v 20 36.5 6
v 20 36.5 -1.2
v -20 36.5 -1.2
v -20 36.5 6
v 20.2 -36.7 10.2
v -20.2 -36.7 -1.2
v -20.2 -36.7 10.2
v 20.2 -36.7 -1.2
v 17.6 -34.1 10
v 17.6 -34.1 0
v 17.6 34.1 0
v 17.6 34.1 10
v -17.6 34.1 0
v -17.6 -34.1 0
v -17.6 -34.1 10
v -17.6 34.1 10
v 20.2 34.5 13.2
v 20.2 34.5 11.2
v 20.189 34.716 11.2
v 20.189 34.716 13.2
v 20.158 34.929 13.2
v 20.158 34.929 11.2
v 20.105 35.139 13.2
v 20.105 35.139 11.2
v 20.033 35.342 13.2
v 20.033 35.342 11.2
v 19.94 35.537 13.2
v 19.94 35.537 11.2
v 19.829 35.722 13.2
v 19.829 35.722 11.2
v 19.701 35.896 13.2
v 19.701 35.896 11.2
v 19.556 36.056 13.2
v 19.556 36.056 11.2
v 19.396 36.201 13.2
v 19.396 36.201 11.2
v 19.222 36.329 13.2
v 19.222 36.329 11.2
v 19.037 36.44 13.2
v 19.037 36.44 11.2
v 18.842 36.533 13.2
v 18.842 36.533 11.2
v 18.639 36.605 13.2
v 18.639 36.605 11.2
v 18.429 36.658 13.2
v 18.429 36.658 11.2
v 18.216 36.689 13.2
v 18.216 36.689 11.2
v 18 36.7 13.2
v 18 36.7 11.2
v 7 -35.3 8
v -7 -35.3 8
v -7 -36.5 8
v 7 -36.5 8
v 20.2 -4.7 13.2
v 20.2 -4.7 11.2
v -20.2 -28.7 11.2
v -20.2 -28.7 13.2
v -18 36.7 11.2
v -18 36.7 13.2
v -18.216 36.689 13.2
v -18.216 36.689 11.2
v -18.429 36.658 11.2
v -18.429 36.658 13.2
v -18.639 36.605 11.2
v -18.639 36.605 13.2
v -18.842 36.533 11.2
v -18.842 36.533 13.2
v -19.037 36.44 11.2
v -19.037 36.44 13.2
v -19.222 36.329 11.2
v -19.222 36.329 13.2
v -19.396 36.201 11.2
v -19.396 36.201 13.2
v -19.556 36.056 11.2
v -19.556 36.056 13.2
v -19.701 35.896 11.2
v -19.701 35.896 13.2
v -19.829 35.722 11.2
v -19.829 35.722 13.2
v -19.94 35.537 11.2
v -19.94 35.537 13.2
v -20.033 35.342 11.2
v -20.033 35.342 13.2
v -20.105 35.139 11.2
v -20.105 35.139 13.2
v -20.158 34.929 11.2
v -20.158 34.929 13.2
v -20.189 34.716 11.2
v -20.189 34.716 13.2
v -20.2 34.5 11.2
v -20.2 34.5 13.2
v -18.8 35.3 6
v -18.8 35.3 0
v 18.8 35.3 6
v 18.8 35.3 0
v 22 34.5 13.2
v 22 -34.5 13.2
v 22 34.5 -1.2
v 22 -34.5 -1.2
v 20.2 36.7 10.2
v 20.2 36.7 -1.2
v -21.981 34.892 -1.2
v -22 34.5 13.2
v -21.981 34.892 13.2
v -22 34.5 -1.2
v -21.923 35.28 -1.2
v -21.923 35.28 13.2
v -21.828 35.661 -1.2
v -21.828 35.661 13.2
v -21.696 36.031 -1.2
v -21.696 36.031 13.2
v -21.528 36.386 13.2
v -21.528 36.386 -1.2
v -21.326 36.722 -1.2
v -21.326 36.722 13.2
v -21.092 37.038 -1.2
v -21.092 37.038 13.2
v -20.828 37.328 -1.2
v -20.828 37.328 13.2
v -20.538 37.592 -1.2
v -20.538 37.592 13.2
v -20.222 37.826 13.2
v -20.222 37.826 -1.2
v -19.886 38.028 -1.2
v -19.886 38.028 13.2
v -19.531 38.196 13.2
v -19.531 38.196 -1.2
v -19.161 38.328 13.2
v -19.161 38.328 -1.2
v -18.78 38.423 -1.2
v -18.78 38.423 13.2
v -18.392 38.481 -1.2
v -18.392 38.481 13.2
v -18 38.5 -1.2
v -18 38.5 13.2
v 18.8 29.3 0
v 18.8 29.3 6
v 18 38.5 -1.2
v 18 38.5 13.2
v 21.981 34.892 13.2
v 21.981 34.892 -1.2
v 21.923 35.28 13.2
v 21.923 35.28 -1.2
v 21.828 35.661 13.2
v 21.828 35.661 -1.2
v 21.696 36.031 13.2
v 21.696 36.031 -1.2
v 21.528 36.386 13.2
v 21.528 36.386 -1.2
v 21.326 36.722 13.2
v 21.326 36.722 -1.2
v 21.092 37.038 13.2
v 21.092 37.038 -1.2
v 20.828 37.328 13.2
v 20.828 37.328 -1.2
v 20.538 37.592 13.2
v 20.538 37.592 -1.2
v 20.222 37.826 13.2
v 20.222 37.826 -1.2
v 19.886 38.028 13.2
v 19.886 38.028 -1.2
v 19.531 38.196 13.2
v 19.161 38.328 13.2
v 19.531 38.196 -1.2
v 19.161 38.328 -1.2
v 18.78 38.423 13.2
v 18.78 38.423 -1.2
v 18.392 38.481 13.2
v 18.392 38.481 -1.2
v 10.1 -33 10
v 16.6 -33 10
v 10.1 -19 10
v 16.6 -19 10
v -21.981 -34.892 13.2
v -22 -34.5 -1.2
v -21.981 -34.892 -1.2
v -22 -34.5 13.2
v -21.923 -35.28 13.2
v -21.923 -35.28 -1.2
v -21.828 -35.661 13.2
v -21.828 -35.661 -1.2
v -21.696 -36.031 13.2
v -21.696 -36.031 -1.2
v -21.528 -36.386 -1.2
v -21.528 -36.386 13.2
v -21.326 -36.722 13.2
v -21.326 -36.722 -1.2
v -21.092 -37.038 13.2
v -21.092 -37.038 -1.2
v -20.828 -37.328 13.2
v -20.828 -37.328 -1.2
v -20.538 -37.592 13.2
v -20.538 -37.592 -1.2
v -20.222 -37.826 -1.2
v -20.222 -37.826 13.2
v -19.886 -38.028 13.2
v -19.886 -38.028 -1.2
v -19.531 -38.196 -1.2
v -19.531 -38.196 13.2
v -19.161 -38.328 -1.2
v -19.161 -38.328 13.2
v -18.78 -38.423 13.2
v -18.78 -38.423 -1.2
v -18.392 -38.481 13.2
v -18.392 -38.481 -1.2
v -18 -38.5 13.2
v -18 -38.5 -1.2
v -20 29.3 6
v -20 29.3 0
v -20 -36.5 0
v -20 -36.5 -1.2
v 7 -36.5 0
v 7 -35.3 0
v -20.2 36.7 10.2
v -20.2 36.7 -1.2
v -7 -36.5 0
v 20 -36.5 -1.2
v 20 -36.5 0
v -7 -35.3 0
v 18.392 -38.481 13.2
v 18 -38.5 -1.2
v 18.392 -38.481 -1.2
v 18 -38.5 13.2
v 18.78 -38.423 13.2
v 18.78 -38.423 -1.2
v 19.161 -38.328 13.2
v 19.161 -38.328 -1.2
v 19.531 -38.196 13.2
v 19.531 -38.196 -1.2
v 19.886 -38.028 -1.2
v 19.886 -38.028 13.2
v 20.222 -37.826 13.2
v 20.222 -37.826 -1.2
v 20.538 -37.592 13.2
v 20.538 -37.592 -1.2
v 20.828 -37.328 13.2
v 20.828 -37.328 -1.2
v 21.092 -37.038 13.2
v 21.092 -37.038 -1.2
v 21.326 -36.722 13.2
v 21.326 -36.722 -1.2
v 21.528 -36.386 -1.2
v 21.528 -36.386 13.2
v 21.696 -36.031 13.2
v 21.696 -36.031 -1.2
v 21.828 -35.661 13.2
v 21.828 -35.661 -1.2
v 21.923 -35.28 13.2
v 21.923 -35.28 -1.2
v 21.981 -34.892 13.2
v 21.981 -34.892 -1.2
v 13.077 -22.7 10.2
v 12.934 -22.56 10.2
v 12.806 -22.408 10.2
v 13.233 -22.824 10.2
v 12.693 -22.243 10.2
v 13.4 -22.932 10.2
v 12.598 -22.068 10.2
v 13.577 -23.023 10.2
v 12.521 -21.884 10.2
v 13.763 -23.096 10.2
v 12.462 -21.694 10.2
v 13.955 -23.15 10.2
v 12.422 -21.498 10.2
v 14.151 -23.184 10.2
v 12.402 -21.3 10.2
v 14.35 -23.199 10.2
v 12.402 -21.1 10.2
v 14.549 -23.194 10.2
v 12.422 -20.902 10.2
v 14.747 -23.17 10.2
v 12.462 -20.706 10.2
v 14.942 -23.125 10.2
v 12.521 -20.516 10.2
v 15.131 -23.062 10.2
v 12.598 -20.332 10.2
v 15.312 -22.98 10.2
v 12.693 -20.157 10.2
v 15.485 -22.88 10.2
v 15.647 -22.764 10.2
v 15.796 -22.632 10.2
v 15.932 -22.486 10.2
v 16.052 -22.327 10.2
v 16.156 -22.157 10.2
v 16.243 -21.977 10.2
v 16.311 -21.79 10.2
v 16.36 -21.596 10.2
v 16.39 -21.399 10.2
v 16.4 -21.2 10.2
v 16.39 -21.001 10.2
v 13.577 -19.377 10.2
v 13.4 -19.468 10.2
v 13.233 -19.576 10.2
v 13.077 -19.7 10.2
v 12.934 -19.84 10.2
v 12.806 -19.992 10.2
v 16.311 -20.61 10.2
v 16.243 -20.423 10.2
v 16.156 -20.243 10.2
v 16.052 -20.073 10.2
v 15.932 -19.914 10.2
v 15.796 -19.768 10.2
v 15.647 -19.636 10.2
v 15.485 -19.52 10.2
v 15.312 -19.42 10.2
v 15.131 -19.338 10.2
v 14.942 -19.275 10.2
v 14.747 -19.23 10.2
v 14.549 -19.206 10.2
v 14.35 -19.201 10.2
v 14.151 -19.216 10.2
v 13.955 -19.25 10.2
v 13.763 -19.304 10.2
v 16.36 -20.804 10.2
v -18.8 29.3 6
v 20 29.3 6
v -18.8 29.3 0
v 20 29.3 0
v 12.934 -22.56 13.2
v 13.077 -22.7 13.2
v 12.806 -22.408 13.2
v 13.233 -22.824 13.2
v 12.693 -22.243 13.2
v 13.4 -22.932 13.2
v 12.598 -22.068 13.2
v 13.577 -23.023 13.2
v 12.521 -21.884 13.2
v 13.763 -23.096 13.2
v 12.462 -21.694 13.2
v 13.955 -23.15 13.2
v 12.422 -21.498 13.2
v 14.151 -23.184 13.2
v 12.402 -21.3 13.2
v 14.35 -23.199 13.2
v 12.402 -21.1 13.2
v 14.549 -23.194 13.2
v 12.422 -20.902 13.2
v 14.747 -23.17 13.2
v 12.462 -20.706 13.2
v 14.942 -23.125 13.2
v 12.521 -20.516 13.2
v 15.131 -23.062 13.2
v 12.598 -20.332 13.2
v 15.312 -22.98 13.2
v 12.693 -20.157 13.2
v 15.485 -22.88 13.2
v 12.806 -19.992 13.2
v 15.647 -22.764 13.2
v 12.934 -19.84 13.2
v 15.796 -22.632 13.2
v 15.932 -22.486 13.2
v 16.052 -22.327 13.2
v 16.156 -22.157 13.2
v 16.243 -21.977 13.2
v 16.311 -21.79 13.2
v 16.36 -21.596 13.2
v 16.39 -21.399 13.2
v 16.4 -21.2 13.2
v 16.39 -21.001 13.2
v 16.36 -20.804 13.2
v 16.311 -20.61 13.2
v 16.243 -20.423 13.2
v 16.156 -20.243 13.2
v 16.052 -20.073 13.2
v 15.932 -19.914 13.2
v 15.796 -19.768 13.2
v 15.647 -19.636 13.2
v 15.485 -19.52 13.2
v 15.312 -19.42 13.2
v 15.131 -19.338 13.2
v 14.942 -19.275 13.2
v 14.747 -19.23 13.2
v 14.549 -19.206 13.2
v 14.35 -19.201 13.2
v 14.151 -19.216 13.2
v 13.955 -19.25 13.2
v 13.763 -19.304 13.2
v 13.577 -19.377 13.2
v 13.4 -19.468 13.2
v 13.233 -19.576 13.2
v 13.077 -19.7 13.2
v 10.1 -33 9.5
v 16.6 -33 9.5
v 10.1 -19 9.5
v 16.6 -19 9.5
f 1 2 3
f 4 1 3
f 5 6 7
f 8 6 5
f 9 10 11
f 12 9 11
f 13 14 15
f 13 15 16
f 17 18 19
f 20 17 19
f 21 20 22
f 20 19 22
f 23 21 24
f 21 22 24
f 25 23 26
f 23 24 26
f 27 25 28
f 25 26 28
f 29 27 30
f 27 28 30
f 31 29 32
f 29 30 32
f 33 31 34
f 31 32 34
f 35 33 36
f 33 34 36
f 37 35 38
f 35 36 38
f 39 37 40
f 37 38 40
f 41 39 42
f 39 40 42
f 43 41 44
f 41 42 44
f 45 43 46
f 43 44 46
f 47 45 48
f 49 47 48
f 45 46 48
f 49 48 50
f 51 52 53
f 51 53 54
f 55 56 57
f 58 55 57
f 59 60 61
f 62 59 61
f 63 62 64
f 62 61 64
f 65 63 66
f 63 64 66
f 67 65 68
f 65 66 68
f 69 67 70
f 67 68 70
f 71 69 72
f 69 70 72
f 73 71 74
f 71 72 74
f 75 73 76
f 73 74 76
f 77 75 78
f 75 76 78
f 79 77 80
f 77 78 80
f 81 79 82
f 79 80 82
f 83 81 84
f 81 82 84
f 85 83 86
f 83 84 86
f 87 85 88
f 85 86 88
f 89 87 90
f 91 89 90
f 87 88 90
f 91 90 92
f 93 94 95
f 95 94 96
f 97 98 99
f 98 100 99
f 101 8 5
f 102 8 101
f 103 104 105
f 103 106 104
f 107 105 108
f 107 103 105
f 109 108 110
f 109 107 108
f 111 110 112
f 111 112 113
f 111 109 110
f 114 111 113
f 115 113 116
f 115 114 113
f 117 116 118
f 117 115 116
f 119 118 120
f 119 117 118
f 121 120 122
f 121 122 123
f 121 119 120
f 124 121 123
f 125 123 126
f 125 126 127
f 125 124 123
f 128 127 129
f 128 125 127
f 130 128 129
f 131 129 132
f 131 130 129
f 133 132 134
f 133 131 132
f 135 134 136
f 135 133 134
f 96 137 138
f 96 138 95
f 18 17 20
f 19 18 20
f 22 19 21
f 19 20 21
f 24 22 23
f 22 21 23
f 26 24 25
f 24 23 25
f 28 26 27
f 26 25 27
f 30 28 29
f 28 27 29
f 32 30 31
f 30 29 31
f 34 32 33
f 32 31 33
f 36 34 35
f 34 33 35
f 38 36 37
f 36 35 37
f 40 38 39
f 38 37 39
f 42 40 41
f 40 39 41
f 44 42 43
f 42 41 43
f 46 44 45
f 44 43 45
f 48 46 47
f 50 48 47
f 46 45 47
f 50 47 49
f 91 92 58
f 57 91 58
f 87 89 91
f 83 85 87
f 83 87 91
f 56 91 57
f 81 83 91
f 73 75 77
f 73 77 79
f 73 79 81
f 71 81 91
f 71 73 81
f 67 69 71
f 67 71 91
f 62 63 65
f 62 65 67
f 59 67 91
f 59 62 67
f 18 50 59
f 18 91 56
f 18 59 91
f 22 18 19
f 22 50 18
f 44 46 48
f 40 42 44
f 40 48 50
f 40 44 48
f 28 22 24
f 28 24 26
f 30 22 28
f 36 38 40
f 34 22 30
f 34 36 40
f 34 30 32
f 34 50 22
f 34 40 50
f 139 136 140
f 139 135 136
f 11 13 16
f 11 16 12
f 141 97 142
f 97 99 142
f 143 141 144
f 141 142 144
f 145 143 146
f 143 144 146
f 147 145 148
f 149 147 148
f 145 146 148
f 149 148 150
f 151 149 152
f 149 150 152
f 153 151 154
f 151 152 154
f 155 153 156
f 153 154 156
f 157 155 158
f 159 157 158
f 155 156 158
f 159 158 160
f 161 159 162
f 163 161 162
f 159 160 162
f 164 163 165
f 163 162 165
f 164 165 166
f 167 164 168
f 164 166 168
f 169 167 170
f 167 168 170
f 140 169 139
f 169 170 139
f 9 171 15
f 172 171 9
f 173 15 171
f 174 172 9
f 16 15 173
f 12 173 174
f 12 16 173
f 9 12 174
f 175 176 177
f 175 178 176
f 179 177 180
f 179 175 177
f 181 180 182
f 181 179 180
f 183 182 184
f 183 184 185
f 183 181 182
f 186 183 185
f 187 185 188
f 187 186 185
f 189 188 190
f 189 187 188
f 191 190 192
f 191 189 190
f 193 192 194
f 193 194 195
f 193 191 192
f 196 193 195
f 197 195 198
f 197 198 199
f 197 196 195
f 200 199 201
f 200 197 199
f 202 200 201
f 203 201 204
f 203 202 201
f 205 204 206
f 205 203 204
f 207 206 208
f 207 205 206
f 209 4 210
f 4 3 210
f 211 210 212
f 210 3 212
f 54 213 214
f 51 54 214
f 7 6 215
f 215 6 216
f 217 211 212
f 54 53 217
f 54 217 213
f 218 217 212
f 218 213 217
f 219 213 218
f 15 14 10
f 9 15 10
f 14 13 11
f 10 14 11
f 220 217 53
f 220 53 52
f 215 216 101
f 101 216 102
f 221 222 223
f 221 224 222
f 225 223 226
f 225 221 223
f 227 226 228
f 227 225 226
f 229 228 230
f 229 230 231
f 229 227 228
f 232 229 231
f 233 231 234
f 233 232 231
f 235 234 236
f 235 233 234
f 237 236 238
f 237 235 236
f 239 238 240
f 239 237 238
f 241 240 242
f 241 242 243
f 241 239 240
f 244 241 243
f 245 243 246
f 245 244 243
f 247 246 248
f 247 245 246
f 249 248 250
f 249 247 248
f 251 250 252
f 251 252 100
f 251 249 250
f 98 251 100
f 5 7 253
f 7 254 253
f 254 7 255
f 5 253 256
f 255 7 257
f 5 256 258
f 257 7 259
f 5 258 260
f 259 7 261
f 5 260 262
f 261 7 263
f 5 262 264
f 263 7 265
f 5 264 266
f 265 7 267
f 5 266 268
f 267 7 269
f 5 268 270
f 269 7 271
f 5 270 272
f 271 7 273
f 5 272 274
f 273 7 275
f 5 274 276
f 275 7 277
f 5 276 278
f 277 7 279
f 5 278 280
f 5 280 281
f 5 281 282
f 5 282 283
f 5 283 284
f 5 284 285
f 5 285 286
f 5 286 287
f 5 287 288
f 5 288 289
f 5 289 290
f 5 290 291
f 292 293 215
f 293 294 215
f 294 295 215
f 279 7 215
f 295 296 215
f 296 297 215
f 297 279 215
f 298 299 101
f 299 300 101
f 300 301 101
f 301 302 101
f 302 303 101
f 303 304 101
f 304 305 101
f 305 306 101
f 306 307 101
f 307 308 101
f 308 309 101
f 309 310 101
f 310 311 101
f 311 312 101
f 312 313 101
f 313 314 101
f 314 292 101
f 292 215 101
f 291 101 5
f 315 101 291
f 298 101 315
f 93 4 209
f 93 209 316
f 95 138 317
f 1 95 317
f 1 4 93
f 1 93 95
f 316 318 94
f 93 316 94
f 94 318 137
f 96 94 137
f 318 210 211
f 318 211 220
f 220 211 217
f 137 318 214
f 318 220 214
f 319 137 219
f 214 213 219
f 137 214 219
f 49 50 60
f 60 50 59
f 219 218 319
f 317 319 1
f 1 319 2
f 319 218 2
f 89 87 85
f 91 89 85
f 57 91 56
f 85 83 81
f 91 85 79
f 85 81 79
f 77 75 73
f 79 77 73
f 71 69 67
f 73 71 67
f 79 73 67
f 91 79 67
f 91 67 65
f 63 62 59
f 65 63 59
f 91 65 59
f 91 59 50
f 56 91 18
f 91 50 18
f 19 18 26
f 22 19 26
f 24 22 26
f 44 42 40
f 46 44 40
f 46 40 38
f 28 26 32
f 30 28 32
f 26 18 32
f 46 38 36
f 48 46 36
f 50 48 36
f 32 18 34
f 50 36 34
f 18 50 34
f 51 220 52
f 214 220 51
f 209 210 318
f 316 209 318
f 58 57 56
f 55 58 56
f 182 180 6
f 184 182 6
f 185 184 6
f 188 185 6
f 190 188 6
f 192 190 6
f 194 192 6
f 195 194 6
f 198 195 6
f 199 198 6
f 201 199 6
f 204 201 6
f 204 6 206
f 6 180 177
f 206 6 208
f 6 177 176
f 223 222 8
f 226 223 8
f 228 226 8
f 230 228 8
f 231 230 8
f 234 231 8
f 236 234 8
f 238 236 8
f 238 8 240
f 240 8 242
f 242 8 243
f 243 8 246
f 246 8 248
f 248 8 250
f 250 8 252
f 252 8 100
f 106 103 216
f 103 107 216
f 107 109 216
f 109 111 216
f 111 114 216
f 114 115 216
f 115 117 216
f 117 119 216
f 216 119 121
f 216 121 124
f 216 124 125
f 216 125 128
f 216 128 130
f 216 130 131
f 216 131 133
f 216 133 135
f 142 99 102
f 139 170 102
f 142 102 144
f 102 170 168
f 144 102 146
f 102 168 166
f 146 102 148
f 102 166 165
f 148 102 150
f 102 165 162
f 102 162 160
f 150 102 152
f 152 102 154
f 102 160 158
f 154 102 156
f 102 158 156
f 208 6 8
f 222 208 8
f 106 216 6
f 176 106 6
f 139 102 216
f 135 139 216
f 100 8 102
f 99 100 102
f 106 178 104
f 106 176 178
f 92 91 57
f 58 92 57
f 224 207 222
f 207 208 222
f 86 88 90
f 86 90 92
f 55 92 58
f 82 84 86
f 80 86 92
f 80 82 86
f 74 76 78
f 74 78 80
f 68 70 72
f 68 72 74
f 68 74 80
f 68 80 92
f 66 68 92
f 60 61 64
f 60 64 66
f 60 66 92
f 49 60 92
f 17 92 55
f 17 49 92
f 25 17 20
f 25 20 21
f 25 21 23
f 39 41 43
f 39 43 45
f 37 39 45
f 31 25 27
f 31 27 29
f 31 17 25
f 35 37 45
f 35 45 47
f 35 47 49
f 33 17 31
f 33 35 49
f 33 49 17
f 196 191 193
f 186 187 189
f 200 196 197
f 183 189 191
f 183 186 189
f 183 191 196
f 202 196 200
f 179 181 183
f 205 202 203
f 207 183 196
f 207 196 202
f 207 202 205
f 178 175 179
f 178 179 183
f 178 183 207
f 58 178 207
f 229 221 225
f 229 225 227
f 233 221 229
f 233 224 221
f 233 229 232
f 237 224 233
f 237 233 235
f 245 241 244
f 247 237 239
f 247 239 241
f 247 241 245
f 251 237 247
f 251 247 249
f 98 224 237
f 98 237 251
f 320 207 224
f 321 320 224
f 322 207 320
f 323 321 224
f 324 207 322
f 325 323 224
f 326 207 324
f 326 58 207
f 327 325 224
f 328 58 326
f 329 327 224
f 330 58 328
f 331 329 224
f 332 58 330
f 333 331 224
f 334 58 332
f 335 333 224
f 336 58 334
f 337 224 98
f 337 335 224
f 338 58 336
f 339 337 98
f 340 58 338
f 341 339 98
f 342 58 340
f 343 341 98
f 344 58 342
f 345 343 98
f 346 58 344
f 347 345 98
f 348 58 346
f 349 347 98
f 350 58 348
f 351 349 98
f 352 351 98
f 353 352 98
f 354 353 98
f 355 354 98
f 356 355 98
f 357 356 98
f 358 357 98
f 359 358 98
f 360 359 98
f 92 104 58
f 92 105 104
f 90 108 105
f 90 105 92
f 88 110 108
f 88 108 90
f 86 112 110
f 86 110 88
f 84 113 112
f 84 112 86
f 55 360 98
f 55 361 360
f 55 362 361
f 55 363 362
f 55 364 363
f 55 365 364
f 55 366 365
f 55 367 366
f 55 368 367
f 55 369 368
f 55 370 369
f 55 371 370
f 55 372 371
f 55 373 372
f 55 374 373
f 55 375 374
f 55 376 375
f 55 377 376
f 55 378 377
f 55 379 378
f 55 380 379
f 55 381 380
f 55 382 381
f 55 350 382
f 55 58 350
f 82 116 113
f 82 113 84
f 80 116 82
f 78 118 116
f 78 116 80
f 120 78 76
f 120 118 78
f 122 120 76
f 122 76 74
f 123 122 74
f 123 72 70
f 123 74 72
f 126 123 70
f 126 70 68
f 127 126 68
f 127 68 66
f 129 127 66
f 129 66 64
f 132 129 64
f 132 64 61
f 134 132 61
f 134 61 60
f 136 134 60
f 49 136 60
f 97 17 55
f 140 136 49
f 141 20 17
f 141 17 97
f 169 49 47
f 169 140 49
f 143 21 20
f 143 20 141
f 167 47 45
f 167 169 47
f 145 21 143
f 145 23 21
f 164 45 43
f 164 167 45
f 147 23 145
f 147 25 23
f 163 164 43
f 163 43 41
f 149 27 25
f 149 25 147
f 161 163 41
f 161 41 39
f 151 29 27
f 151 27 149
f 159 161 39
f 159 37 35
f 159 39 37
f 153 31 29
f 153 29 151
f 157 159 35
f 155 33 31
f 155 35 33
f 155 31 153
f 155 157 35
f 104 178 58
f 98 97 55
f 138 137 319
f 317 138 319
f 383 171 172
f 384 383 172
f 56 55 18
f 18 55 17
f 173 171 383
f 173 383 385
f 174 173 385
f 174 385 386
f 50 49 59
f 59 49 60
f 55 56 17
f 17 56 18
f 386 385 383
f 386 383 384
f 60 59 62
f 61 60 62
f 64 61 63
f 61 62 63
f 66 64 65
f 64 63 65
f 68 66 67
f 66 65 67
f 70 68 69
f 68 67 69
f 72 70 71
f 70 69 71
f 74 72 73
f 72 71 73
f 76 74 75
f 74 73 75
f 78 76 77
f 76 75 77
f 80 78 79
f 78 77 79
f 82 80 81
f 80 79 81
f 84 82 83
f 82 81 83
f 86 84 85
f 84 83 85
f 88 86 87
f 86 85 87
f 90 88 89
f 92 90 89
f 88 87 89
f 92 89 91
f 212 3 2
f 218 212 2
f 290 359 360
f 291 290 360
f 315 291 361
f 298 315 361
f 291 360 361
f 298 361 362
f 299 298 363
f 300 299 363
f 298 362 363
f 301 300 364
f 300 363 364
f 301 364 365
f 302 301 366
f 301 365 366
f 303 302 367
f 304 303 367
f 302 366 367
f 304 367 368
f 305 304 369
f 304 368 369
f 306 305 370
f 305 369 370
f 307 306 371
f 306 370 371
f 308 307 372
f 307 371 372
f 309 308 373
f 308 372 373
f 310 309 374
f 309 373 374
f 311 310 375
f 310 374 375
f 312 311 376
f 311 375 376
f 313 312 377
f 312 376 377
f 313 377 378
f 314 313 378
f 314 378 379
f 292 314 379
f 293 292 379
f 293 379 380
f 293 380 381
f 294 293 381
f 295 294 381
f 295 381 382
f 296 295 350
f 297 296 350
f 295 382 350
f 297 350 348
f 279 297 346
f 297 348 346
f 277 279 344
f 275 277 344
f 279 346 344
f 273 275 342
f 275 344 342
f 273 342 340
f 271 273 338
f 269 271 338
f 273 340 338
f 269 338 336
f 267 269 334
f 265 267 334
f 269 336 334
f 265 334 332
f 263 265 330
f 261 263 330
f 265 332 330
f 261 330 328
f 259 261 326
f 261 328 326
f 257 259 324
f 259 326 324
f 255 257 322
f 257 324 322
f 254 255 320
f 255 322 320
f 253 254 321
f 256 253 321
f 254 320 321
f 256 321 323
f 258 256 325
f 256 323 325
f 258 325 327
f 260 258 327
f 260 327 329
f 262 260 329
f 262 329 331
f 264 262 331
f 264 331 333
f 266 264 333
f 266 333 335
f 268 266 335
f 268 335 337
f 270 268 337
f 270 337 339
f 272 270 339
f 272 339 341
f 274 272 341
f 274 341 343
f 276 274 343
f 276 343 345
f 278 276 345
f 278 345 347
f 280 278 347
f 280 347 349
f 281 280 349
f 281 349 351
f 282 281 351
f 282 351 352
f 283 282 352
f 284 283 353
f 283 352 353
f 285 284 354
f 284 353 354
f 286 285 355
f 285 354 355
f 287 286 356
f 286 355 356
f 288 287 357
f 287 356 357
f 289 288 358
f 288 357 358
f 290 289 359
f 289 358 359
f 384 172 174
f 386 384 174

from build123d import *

# Parameters (mm, degrees)
F0_W          = 35.2
F0_H          = 68.2
F1_DEPTH      = 10
F2_W          = 6.5
F2_H          = 14
F3_DEPTH      = 0.5
F4_W          = 40
F4_H          = 73
F5_DEPTH      = 1.2
F6_W          = 44
F6_H          = 77
F6_W_2        = 40.4
F6_H_2        = 73.4
F7_DEPTH      = 11.2
F7_DEPTH_BACK = 0.2
F8_W          = 44
F8_H          = 77
F9_DEPTH      = 3
F10_R         = 4
F11_W         = 14
F11_H         = 1.2
F12_DEPTH     = 8
F13_W         = 1.2
F13_H         = 6
F14_DEPTH     = 6
F16_DEPTH     = 2
F18_DEPTH     = 2
F19_R         = 2
F20_DEPTH     = 3
F22_DEPTH     = 2


with BuildPart() as f1:
    # F0 (on Top) → F1 (new body)
    with BuildSketch(Plane.XY):
        Rectangle(F0_W, F0_H)
    extrude(amount=F1_DEPTH)

    # F2 (on face) → F3 (cut)
    with BuildSketch(Plane.XY.offset(10)):
        with Locations((13.35, -26)):
            Rectangle(F2_W, F2_H)
    extrude(amount=-F3_DEPTH, mode=Mode.SUBTRACT)


with BuildPart() as f5:
    # F4 (on face) → F5 (new body)
    with BuildSketch(Plane(origin=(0, 0, 0), x_dir=(1, 0, 0), z_dir=(0, 0, -1))):
        Rectangle(F4_W, F4_H)
    extrude(amount=F5_DEPTH)

    # F11 (on face) → F12 (join)
    with BuildSketch(Plane.XY):
        with Locations((0, -35.9)):
            Rectangle(F11_W, F11_H)
    extrude(amount=F12_DEPTH)

    # F13 (on face) → F14 (join)
    with BuildSketch(Plane.XY):
        Polygon((20, 36.5), (-20, 36.5), (-20, 35.3), (-18.8, 35.3), (18.8, 35.3), (20, 35.3), align=None)
        with Locations((-19.4, 32.3)):
            Rectangle(F13_W, F13_H)
        with Locations((19.4, 32.3)):
            Rectangle(F13_W, F13_H)
    extrude(amount=F14_DEPTH)


with BuildPart() as f7:
    # F6 (on face) → F7 (new body, two sides)
    with BuildSketch(Plane.XY.offset(10)) as f7_sk:
        Rectangle(F6_W, F6_H)
        Rectangle(F6_W_2, F6_H_2, mode=Mode.SUBTRACT)
    extrude(amount=-F7_DEPTH)
    extrude(f7_sk.sketch, amount=F7_DEPTH_BACK)

    # F8 (on face) → F9 (join)
    with BuildSketch(Plane.XY.offset(10.2)):
        Rectangle(F8_W, F8_H)
    extrude(amount=F9_DEPTH)

    # F10
    f10_edges = [f7.edges().sort_by_distance(p)[0] for p in [
        (-22, 38.5, 6),
        (-22, -38.5, 6),
        (22, 38.5, 6),
        (22, -38.5, 6),
    ]]
    fillet(f10_edges, radius=F10_R)

    # F15 (on face) → F16 (cut)
    with BuildSketch(Plane.XY.offset(13.2)):
        with BuildLine():
            Line((-20.2, 34.5), (-20.2, -34.5))
            ThreePointArc((-20.2, -34.5), (-19.5556349186, -36.0556349186), (-18, -36.7))
            Line((-18, -36.7), (18, -36.7))
            ThreePointArc((18, -36.7), (19.5556349186, -36.0556349186), (20.2, -34.5))
            Line((20.2, -34.5), (20.2, 34.5))
            ThreePointArc((20.2, 34.5), (19.5556349186, 36.0556349186), (18, 36.7))
            Line((18, 36.7), (-18, 36.7))
            ThreePointArc((-18, 36.7), (-19.5556349186, 36.0556349186), (-20.2, 34.5))
        make_face()
    extrude(amount=-F16_DEPTH, mode=Mode.SUBTRACT)

    # F17 (on face) → F18 (join, through all)
    with BuildSketch(Plane.XY.offset(11.2)):
        with BuildLine():
            Line((20.2, -34.5), (20.2, -4.7))
            Line((20.2, -4.7), (-20.2, -28.7))
            Line((-20.2, -28.7), (-20.2, -34.5))
            ThreePointArc((-20.2, -34.5), (-19.5556349186, -36.0556349186), (-18, -36.7))
            Line((-18, -36.7), (18, -36.7))
            ThreePointArc((18, -36.7), (19.5556349186, -36.0556349186), (20.2, -34.5))
        make_face()
    extrude(amount=F18_DEPTH)

    # F19 (on face) → F20 (cut)
    with BuildSketch(Plane.XY.offset(13.2)):
        with Locations((14.4, -21.2)):
            Circle(F19_R)
    extrude(amount=-F20_DEPTH, mode=Mode.SUBTRACT)


with BuildPart() as f22:
    # F21 (on face) → F22 (new body)
    with BuildSketch(Plane.XY.offset(11.2)):
        with BuildLine():
            ThreePointArc((-18, 36.7), (-19.5556349186, 36.0556349186), (-20.2, 34.5))
            Line((-20.2, 34.5), (-20.2, -28.7))
            Line((-20.2, -28.7), (20.2, -4.7))
            Line((20.2, -4.7), (20.2, 34.5))
            ThreePointArc((20.2, 34.5), (19.5556349186, 36.0556349186), (18, 36.7))
            Line((18, 36.7), (-18, 36.7))
        make_face()
    extrude(amount=F22_DEPTH)


solid = Compound([f1.part, f5.part, f7.part, f22.part])
